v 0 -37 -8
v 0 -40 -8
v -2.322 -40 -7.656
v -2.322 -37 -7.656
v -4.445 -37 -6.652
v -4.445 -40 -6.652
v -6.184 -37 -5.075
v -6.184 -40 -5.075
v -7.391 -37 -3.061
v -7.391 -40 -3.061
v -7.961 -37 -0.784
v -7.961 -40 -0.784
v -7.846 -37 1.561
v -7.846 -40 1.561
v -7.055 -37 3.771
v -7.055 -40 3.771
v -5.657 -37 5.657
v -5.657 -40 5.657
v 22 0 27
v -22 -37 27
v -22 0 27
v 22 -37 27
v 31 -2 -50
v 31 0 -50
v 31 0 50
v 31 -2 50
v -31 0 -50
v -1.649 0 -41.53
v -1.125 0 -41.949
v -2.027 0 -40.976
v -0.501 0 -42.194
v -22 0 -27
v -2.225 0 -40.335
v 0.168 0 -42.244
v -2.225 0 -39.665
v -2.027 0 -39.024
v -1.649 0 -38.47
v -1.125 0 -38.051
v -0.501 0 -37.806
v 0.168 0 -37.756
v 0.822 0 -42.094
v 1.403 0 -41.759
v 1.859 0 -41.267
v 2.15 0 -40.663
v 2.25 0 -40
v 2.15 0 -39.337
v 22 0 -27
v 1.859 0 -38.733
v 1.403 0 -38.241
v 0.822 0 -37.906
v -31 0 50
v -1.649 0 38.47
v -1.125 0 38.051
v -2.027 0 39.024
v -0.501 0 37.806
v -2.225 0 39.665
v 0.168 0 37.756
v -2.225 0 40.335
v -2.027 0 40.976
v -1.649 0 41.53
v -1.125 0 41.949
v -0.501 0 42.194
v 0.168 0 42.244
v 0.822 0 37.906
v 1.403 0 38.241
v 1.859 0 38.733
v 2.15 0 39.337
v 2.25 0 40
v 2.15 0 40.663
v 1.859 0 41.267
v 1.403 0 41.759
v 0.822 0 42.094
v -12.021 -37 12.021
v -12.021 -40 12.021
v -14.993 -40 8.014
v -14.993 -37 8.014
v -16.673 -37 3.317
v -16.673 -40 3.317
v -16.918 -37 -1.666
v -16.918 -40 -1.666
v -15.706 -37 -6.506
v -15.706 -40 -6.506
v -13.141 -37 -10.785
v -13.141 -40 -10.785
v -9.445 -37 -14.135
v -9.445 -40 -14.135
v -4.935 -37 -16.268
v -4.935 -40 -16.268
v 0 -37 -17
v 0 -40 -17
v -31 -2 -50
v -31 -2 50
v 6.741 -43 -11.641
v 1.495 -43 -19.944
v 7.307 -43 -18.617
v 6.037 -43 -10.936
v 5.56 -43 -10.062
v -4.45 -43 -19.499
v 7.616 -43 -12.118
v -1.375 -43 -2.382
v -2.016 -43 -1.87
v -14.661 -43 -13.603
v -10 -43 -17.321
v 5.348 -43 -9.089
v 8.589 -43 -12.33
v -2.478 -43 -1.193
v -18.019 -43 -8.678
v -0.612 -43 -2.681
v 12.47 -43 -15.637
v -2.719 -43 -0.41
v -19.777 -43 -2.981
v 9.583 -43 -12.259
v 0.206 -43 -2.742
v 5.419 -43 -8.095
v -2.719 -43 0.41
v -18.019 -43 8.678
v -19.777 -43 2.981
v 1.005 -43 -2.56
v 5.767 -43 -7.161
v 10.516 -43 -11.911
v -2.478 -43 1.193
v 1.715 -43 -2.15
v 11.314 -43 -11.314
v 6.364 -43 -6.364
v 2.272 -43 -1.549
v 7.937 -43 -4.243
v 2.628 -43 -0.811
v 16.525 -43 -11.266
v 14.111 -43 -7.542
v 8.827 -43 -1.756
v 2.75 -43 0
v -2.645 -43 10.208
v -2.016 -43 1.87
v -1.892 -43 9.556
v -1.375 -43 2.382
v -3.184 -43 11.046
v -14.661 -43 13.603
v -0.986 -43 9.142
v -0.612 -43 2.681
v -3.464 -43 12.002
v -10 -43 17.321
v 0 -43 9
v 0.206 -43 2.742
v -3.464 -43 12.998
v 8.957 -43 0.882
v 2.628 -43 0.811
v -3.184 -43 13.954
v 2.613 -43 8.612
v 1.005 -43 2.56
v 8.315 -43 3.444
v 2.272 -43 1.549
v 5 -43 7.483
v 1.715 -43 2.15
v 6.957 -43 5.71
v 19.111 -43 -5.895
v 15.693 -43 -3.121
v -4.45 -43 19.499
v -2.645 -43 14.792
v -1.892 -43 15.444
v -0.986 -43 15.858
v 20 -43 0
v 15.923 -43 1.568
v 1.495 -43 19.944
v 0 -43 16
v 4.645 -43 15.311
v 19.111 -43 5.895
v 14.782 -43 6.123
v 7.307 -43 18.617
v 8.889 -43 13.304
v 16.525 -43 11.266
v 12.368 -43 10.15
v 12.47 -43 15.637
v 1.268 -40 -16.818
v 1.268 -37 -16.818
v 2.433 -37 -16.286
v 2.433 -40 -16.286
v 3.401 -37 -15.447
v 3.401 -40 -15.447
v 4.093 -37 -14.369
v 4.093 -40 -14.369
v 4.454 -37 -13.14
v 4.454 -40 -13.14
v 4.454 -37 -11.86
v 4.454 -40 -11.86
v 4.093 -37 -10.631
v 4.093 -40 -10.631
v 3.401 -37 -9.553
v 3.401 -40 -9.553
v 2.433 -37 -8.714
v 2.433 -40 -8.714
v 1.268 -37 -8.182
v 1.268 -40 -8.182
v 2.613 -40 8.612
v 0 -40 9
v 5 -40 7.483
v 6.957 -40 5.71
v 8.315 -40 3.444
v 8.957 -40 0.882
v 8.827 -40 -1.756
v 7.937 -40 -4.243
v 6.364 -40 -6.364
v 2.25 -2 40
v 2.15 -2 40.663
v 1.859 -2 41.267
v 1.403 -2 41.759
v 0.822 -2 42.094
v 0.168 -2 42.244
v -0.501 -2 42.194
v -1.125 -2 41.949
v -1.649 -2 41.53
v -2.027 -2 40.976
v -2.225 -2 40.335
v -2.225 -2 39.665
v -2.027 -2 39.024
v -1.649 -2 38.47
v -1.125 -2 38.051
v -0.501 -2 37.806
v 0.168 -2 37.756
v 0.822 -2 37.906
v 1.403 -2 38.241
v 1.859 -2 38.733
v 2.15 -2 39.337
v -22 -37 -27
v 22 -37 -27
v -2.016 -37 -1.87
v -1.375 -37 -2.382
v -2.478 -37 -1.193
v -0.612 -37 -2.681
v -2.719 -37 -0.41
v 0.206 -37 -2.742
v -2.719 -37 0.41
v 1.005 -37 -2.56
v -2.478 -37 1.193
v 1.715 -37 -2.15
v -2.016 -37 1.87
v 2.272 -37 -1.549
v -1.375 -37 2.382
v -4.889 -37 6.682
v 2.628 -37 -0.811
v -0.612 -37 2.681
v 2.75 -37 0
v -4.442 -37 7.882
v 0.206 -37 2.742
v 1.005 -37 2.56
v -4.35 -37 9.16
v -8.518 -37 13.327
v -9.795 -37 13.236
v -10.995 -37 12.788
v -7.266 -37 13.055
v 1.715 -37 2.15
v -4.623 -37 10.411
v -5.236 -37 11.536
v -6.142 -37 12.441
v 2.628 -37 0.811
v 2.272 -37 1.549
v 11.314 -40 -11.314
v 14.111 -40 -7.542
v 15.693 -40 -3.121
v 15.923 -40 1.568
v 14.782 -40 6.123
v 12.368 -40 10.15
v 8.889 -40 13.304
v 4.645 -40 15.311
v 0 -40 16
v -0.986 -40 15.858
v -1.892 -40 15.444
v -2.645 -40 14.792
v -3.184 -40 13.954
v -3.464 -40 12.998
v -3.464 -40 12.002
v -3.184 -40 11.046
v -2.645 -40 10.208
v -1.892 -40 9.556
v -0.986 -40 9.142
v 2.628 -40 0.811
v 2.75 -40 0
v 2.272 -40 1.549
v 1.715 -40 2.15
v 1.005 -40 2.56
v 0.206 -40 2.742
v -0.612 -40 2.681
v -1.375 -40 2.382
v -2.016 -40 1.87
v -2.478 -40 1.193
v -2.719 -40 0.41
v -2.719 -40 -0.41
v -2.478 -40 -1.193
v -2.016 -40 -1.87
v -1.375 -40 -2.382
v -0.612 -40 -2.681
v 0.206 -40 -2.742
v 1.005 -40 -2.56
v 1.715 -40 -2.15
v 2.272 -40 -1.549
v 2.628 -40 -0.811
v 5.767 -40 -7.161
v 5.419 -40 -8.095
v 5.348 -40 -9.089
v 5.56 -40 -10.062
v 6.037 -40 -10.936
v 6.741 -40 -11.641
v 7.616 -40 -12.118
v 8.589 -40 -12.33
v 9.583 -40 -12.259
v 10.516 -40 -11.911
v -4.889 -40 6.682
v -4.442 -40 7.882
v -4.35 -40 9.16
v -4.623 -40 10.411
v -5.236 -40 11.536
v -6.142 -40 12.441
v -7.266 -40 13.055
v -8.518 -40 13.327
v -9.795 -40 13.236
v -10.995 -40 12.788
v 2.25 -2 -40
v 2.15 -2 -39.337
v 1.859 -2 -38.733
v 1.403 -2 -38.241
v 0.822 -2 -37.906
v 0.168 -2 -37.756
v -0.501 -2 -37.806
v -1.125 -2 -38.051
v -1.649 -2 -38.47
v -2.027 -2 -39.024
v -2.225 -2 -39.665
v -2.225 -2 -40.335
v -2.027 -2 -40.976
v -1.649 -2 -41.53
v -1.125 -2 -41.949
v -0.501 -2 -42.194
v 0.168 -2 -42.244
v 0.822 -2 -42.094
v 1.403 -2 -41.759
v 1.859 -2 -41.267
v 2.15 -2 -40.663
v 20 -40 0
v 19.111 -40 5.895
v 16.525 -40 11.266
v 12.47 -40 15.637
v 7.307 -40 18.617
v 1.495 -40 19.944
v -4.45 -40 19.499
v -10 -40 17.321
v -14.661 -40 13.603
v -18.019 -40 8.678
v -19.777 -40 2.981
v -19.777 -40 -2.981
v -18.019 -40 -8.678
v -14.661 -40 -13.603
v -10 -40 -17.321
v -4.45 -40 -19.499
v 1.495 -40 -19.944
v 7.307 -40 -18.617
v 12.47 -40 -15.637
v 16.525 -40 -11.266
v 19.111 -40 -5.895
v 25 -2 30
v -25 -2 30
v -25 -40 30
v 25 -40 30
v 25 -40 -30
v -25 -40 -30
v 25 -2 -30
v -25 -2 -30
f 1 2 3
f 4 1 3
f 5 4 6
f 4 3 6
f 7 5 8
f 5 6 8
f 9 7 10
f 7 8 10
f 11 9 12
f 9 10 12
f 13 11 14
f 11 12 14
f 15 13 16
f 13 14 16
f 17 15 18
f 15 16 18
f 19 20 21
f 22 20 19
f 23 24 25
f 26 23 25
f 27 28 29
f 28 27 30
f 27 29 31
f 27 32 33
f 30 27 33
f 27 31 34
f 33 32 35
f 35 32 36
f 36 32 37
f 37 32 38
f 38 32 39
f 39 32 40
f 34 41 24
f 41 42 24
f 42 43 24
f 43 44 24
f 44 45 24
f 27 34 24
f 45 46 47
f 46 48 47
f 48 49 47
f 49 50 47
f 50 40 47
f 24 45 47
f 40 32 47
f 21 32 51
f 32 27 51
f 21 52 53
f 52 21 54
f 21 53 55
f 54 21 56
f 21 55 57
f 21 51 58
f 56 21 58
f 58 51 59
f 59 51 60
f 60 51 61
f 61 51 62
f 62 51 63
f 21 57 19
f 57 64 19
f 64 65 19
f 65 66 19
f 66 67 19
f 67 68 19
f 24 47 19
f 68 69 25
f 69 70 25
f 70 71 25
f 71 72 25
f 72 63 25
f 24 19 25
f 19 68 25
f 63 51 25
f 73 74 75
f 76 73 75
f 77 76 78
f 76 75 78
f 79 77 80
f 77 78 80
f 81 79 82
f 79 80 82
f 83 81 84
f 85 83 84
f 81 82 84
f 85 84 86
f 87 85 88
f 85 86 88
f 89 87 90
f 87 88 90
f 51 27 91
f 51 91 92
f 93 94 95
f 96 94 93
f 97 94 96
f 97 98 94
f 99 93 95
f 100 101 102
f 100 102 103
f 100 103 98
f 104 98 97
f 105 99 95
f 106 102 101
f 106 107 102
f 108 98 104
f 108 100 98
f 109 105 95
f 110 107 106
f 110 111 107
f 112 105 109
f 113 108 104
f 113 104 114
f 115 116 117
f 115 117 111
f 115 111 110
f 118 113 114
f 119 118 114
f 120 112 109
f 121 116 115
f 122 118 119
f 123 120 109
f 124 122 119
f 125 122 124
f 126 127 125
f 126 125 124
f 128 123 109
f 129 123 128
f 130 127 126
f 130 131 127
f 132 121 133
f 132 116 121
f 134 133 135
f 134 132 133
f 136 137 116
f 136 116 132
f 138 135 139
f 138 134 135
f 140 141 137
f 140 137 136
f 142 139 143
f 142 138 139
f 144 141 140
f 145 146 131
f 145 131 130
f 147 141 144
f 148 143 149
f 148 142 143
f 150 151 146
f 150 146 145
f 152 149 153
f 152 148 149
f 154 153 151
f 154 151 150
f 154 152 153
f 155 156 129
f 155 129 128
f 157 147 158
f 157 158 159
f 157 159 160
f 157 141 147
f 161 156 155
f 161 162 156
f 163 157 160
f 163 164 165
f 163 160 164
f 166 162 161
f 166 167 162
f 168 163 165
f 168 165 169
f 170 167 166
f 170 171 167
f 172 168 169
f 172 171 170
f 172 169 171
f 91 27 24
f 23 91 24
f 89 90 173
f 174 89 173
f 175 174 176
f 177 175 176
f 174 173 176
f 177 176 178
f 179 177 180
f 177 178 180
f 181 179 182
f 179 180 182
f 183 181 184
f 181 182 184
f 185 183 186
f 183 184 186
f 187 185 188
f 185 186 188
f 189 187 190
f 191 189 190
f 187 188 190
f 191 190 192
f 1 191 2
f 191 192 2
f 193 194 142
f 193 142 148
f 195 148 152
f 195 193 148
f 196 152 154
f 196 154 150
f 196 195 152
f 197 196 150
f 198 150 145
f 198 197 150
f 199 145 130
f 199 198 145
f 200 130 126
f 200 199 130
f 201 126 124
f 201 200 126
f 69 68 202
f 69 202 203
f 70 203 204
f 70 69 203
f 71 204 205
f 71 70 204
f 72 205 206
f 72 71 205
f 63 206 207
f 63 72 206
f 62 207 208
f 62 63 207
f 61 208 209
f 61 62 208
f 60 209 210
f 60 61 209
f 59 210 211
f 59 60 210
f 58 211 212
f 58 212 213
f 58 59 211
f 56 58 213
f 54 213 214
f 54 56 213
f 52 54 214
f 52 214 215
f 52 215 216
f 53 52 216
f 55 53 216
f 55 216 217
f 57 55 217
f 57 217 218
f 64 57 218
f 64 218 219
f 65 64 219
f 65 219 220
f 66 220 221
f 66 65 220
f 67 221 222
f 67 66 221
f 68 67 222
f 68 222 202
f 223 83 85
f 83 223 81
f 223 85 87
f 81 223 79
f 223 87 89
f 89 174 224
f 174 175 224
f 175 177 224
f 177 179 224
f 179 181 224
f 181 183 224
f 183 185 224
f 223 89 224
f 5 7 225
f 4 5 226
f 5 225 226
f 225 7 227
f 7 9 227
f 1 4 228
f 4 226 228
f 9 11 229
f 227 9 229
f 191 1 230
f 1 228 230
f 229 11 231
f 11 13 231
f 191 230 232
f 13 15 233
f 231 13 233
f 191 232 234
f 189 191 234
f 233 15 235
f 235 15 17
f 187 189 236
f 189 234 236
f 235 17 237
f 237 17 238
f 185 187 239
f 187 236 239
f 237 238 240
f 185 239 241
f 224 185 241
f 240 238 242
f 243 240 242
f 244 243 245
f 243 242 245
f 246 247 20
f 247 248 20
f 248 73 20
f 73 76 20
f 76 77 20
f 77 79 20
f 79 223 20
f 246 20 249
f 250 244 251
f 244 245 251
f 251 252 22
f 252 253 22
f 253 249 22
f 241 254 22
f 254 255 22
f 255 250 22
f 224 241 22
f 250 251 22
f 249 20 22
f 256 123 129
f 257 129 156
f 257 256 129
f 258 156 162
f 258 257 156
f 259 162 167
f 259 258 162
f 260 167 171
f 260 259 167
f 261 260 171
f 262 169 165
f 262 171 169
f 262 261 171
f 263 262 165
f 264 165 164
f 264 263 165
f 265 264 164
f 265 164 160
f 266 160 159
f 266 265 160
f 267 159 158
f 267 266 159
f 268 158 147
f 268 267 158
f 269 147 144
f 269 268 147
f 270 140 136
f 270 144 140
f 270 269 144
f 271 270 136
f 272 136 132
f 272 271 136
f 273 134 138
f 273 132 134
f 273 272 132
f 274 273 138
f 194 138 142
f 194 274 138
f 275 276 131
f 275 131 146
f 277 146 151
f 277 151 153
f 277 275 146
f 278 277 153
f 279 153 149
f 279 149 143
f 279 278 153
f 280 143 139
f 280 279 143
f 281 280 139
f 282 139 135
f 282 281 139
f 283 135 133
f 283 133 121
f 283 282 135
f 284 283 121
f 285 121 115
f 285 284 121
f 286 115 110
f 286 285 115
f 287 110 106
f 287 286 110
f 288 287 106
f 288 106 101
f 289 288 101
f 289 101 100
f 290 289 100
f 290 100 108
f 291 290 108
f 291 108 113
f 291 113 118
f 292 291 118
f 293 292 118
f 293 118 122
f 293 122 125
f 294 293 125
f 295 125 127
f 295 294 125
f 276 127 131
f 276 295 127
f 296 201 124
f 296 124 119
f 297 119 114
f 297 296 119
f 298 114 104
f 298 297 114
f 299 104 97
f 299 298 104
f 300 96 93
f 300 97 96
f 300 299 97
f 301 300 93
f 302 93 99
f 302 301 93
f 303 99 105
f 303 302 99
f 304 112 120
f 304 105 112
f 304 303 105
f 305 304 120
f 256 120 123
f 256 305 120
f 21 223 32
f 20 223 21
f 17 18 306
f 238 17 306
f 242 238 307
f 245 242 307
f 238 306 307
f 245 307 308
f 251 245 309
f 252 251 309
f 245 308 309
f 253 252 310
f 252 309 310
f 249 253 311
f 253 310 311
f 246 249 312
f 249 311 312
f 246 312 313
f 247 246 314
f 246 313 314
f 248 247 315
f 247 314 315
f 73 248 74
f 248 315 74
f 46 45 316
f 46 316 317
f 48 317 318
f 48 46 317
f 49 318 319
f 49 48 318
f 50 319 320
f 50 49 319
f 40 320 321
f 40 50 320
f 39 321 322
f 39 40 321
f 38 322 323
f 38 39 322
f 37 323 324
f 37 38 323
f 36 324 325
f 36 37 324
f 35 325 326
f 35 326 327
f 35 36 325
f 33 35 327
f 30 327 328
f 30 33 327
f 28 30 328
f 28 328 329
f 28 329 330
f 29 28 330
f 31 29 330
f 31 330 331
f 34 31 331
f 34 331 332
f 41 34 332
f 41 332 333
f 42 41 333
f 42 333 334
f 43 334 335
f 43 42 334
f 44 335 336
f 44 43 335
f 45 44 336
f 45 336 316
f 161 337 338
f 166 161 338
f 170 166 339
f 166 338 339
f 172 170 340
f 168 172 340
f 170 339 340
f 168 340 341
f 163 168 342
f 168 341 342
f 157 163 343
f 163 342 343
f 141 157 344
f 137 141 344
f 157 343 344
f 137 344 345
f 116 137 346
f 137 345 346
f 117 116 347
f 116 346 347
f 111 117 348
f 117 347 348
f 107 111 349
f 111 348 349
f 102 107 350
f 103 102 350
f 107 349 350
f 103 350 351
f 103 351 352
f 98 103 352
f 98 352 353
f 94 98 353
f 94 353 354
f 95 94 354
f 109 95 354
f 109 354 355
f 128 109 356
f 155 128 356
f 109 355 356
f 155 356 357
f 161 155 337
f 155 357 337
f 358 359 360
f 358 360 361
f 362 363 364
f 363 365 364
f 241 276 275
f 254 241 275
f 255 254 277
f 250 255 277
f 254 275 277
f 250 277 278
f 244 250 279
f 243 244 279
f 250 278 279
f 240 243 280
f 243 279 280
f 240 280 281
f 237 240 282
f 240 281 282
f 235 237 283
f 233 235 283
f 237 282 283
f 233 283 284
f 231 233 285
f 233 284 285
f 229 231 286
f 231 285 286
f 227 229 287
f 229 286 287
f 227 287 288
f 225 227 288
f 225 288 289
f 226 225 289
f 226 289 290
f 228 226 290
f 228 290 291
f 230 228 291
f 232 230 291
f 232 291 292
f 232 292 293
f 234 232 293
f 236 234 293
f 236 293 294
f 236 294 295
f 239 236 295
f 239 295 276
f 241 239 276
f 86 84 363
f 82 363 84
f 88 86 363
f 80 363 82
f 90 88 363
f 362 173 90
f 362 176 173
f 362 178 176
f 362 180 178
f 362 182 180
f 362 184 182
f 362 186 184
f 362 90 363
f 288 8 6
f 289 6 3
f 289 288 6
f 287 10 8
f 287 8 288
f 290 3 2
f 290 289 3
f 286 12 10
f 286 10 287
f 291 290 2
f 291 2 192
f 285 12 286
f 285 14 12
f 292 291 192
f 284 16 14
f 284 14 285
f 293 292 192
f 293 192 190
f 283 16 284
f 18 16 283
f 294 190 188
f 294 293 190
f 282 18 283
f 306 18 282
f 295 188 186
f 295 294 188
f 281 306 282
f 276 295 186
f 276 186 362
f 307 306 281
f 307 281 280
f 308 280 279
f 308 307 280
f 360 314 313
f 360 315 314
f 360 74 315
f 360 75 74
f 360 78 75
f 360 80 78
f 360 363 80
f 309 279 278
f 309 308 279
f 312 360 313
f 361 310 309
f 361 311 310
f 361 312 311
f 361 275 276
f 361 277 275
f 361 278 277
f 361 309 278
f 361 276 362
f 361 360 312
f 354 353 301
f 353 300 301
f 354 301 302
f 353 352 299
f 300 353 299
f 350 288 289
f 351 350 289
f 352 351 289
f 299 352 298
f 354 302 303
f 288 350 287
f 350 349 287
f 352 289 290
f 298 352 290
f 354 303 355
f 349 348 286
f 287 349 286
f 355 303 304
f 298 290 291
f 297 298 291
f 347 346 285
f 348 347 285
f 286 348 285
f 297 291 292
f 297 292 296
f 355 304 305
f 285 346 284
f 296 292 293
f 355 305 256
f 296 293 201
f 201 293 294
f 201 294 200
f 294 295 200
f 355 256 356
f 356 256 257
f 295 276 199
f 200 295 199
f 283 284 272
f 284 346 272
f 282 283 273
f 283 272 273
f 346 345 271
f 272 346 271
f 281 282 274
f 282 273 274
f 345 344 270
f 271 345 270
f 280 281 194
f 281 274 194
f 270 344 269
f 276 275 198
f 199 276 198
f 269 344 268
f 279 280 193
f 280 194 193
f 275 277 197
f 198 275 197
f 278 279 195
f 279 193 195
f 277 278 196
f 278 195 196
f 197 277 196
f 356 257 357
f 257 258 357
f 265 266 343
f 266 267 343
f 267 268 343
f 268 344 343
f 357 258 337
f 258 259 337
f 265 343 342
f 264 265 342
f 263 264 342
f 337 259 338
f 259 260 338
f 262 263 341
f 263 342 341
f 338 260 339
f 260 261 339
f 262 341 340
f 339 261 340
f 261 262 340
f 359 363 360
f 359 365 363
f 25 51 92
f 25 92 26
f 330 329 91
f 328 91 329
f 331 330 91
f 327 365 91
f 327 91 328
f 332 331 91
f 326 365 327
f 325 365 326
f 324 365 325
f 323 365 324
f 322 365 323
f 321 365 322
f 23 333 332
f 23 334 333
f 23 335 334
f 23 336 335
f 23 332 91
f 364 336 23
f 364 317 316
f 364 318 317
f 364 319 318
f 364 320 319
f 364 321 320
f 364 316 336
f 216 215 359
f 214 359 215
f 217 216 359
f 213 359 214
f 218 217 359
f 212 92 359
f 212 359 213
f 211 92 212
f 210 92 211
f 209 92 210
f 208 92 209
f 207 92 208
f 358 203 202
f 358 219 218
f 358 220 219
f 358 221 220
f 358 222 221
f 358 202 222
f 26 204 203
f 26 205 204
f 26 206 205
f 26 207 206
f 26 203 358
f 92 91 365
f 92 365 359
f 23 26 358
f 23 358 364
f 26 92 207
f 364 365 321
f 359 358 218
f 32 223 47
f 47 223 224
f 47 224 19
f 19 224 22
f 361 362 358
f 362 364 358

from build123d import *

# Parameters (mm, degrees)
F0_W      = 62
F0_H      = 100
F0_R      = 2.25
F1_DEPTH  = 2
F2_W      = 50
F2_H      = 60
F2_W_2    = 44
F2_H_2    = 54
F3_DEPTH  = 35
F3_FACE_W = 44
F3_FACE_H = 54
F4_DEPTH  = 2.001
F6_W      = 50
F6_H      = 60
F7_DEPTH  = 3
F8_R      = 20
F8_R_2    = 2.75
F11_DEPTH = 3
F14_DEPTH = 3.001
F15_DEPTH = 40.001
F16_DEPTH = 40.001


with BuildPart() as f1:
    # F0 (on Front) → F1 (new body)
    with BuildSketch(Plane.XZ):
        Rectangle(F0_W, F0_H)
        with Locations((0, -40)):
            Circle(F0_R, mode=Mode.SUBTRACT)
        with Locations((0, 40)):
            Circle(F0_R, mode=Mode.SUBTRACT)
    extrude(amount=F1_DEPTH)

    # F2 (on face) → F3 (join)
    with BuildSketch(Plane.XZ.offset(2)):
        Rectangle(F2_W, F2_H)
        Rectangle(F2_W_2, F2_H_2, mode=Mode.SUBTRACT)
    extrude(amount=F3_DEPTH)

    # F3_face (on face) → F4 (cut, through all)
    with BuildSketch(Plane.XZ.offset(2)):
        Rectangle(F3_FACE_W, F3_FACE_H)
    extrude(amount=-F4_DEPTH, mode=Mode.SUBTRACT)

    # F6 (on offset) → F7 (join)
    with BuildSketch(Plane.XZ.offset(37)):
        Rectangle(F6_W, F6_H)
    extrude(amount=F7_DEPTH)

    # F12 (on offset) → F15 (cut, through all)
    with BuildSketch(Plane.XZ.offset(40)):
        with BuildLine():
            ThreePointArc((-5.656854, 5.656854), (-5.656854, 12.020815), (-12.020815, 12.020815))
            ThreePointArc((-12.020815, 12.020815), (-15.705952, -6.505618), (0, -17))
            ThreePointArc((0, -17), (4.5, -12.5), (0, -8))
            ThreePointArc((0, -8), (-7.391036, -3.061467), (-5.656854, 5.656854))
        make_face()
    extrude(amount=-F15_DEPTH, mode=Mode.SUBTRACT)

    # F8 (on face) → F16 (cut, through all)
    with BuildSketch(Plane.XZ.offset(40)):
        Circle(F8_R_2)
    extrude(amount=-F16_DEPTH, mode=Mode.SUBTRACT)


with BuildPart() as f11:
    # F8 (on face) → F11 (new body)
    with BuildSketch(Plane.XZ.offset(40)):
        Circle(F8_R)
        with BuildLine():
            ThreePointArc((8.838835, -8.838835), (4.783543, -11.548494), (0, -12.5))
            ThreePointArc((0, -12.5), (-11.548494, -4.783543), (-8.838835, 8.838835))
            ThreePointArc((-8.838835, 8.838835), (-4.783543, 11.548494), (0, 12.5))
            ThreePointArc((0, 12.5), (11.548494, 4.783543), (8.838835, -8.838835))
        make_face(mode=Mode.SUBTRACT)
        with BuildLine():
            ThreePointArc((-8.838835, 8.838835), (-11.548494, -4.783543), (0, -12.5))
            ThreePointArc((0, -12.5), (4.783543, -11.548494), (8.838835, -8.838835))
            ThreePointArc((8.838835, -8.838835), (11.548494, 4.783543), (0, 12.5))
            ThreePointArc((0, 12.5), (-4.783543, 11.548494), (-8.838835, 8.838835))
        make_face()
        Circle(F8_R_2, mode=Mode.SUBTRACT)
    extrude(amount=F11_DEPTH)

    # F13 (on offset) → F14 (cut, through all)
    with BuildSketch(Plane.XZ.offset(40)):
        with BuildLine():
            ThreePointArc((6.363961, -6.363961), (6.363961, -11.313708), (11.313708, -11.313708))
            ThreePointArc((11.313708, -11.313708), (14.782073, 6.122935), (0, 16))
            ThreePointArc((0, 16), (-3.5, 12.5), (0, 9))
            ThreePointArc((0, 9), (8.314916, 3.444151), (6.363961, -6.363961))
        make_face()
    extrude(amount=F14_DEPTH, mode=Mode.SUBTRACT)


solid = Compound([f1.part, f11.part])
